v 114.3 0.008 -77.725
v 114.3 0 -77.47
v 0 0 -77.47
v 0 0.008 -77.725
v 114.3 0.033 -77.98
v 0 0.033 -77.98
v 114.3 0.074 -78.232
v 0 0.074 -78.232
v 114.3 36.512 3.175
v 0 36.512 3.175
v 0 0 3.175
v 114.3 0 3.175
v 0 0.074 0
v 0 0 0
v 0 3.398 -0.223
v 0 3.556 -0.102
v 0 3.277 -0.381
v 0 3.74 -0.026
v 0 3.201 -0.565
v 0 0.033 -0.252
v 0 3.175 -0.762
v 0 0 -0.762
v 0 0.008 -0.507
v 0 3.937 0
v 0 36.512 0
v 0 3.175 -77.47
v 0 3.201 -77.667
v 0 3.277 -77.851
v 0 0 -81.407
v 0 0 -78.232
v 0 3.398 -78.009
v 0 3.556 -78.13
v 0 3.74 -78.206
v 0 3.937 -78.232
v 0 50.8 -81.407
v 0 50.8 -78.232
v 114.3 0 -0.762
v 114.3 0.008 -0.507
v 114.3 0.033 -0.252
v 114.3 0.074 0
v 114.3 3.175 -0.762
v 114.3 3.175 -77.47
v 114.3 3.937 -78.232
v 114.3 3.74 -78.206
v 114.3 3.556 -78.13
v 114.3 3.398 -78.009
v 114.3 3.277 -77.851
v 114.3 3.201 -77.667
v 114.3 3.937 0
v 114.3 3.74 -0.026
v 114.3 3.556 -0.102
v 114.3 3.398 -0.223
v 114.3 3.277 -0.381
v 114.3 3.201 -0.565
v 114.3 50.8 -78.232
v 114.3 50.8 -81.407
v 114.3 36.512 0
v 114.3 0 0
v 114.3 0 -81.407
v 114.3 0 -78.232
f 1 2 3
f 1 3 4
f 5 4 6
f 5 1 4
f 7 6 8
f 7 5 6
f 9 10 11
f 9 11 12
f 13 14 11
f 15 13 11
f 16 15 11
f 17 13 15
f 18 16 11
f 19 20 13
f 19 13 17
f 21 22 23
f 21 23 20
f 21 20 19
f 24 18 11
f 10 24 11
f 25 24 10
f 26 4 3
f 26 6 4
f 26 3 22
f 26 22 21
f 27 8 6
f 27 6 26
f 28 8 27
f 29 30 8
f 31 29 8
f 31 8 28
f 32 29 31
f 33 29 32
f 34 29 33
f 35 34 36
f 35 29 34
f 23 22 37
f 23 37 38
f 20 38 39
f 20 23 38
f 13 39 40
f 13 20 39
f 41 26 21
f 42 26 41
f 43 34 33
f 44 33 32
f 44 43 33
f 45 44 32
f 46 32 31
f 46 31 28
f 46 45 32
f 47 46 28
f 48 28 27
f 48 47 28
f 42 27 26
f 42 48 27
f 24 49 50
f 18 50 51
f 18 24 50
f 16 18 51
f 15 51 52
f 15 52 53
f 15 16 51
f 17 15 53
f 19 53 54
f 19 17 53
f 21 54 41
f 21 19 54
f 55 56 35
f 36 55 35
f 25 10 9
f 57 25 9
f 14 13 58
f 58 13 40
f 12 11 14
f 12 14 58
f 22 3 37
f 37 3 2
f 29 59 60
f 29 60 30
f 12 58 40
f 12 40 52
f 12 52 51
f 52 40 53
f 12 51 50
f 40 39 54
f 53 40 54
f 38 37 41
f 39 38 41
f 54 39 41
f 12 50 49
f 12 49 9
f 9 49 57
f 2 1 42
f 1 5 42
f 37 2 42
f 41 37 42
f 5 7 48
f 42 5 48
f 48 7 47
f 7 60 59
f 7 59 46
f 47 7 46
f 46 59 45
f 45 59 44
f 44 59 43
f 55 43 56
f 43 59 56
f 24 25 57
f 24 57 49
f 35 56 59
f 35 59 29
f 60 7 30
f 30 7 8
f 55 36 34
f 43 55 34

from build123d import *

# Parameters (mm, degrees)
SKETCH1_W                    = 114.3
SKETCH1_H                    = 78.232
BOSS_EXTRUDE1_DEPTH          = 3.175
EDGE_FLANGE1_STRIP_W         = 14.224
EDGE_FLANGE1_STRIP_H         = 3.175
EDGE_FLANGE1_STRIP_CUT_DEPTH = 114.3
EDGE_FLANGE1_DEPTH           = 114.3
EDGE_FLANGE2_STRIP_W         = 14.224
EDGE_FLANGE2_STRIP_H         = 3.175
EDGE_FLANGE2_STRIP_CUT_DEPTH = 114.3
EDGE_FLANGE2_DEPTH           = 114.3
SKETCH9_R                    = 2.667
CUT_EXTRUDE1_DEPTH           = 145.648316869
CHAMFER1_SIZE                = 3.175
SKETCH15_W                   = 114.3
SKETCH15_H                   = 36.5125
BOSS_EXTRUDE2_DEPTH          = 3.175
SKETCH16_W                   = 114.3
SKETCH16_H                   = 50.8
BOSS_EXTRUDE3_DEPTH          = 3.175


# Sheet-metal steps are written as plain solids
with BuildPart() as part:
    # Sketch1 → Boss-Extrude1 (new body)
    with BuildSketch(Plane(origin=(0, 0, 0), x_dir=(1, 0, 0), z_dir=(0, 1, 0))):
        with Locations((57.15, 39.116)):
            Rectangle(SKETCH1_W, SKETCH1_H)
    extrude(amount=BOSS_EXTRUDE1_DEPTH)

    # Edge-Flange1 strip (across the edge) → Edge-Flange1 strip cut (cut)
    with BuildSketch(Plane(origin=(114.3, 3.175, -78.232), x_dir=(0, 0, 1), z_dir=(-1, 0, 0))):
        with Locations((-6.35, -1.5875)):
            Rectangle(EDGE_FLANGE1_STRIP_W, EDGE_FLANGE1_STRIP_H)
    extrude(amount=EDGE_FLANGE1_STRIP_CUT_DEPTH, mode=Mode.SUBTRACT)

    # Edge-Flange1 section (across the edge) → Edge-Flange1 (add)
    with BuildSketch(Plane(origin=(114.3, 3.175, -78.232), x_dir=(0, 0, 1), z_dir=(-1, 0, 0))):
        with BuildLine():
            Line((-3.175, 0.762), (-3.175, 23.368))
            Line((-3.175, 23.368), (0, 23.368))
            Line((0, 23.368), (0, 0.762))
            ThreePointArc((0, 0.762), (0.223184633, 0.223184633), (0.762, 0))
            Line((0.762, 0), (0.762, -3.175))
            ThreePointArc((0.762, -3.175), (-2.021879398, -2.021879398), (-3.175, 0.762))
        make_face()
    extrude(amount=EDGE_FLANGE1_DEPTH)

    # Edge-Flange2 strip (across the edge) → Edge-Flange2 strip cut (cut)
    with BuildSketch(Plane(origin=(0, 3.175, 0), x_dir=(0, 0, -1), z_dir=(1, 0, 0))):
        with Locations((-6.35, -1.5875)):
            Rectangle(EDGE_FLANGE2_STRIP_W, EDGE_FLANGE2_STRIP_H)
    extrude(amount=EDGE_FLANGE2_STRIP_CUT_DEPTH, mode=Mode.SUBTRACT)

    # Edge-Flange2 section (across the edge) → Edge-Flange2 (add)
    with BuildSketch(Plane(origin=(0, 3.175, 0), x_dir=(0, 0, -1), z_dir=(1, 0, 0))):
        with BuildLine():
            Line((-3.175, 0.762), (-3.175, 23.368))
            Line((-3.175, 23.368), (0, 23.368))
            Line((0, 23.368), (0, 0.762))
            ThreePointArc((0, 0.762), (0.223184633, 0.223184633), (0.762, 0))
            Line((0.762, 0), (0.762, -3.175))
            ThreePointArc((0.762, -3.175), (-2.021879398, -2.021879398), (-3.175, 0.762))
        make_face()
    extrude(amount=EDGE_FLANGE2_DEPTH)

    # Sketch9 → Cut-Extrude1 (cut, through all)
    with BuildSketch(Plane.XY.offset(3.175)):
        with Locations((107.95, 16.637)):
            Circle(SKETCH9_R)
    extrude(amount=-CUT_EXTRUDE1_DEPTH, mode=Mode.SUBTRACT)

    # Chamfer1
    chamfer1_edges = [part.edges().sort_by_distance(p)[0] for p in [
        (114.3, 26.543, -79.8195),
        (0, 26.543, -79.8195),
        (0, 26.543, 1.5875),
        (114.3, 26.543, 1.5875),
    ]]
    chamfer(chamfer1_edges, length=CHAMFER1_SIZE)

    # Sketch15 → Boss-Extrude2 (add)
    with BuildSketch(Plane.XY.offset(3.175)):
        with Locations((57.15, 18.25625)):
            Rectangle(SKETCH15_W, SKETCH15_H)
    extrude(amount=-BOSS_EXTRUDE2_DEPTH)

    # Sketch16 → Boss-Extrude3 (add)
    with BuildSketch(Plane(origin=(0, 0, -81.407), x_dir=(-1, 0, 0), z_dir=(0, 0, -1))):
        with Locations((-57.15, 25.4)):
            Rectangle(SKETCH16_W, SKETCH16_H)
    extrude(amount=-BOSS_EXTRUDE3_DEPTH)


solid = part.part
